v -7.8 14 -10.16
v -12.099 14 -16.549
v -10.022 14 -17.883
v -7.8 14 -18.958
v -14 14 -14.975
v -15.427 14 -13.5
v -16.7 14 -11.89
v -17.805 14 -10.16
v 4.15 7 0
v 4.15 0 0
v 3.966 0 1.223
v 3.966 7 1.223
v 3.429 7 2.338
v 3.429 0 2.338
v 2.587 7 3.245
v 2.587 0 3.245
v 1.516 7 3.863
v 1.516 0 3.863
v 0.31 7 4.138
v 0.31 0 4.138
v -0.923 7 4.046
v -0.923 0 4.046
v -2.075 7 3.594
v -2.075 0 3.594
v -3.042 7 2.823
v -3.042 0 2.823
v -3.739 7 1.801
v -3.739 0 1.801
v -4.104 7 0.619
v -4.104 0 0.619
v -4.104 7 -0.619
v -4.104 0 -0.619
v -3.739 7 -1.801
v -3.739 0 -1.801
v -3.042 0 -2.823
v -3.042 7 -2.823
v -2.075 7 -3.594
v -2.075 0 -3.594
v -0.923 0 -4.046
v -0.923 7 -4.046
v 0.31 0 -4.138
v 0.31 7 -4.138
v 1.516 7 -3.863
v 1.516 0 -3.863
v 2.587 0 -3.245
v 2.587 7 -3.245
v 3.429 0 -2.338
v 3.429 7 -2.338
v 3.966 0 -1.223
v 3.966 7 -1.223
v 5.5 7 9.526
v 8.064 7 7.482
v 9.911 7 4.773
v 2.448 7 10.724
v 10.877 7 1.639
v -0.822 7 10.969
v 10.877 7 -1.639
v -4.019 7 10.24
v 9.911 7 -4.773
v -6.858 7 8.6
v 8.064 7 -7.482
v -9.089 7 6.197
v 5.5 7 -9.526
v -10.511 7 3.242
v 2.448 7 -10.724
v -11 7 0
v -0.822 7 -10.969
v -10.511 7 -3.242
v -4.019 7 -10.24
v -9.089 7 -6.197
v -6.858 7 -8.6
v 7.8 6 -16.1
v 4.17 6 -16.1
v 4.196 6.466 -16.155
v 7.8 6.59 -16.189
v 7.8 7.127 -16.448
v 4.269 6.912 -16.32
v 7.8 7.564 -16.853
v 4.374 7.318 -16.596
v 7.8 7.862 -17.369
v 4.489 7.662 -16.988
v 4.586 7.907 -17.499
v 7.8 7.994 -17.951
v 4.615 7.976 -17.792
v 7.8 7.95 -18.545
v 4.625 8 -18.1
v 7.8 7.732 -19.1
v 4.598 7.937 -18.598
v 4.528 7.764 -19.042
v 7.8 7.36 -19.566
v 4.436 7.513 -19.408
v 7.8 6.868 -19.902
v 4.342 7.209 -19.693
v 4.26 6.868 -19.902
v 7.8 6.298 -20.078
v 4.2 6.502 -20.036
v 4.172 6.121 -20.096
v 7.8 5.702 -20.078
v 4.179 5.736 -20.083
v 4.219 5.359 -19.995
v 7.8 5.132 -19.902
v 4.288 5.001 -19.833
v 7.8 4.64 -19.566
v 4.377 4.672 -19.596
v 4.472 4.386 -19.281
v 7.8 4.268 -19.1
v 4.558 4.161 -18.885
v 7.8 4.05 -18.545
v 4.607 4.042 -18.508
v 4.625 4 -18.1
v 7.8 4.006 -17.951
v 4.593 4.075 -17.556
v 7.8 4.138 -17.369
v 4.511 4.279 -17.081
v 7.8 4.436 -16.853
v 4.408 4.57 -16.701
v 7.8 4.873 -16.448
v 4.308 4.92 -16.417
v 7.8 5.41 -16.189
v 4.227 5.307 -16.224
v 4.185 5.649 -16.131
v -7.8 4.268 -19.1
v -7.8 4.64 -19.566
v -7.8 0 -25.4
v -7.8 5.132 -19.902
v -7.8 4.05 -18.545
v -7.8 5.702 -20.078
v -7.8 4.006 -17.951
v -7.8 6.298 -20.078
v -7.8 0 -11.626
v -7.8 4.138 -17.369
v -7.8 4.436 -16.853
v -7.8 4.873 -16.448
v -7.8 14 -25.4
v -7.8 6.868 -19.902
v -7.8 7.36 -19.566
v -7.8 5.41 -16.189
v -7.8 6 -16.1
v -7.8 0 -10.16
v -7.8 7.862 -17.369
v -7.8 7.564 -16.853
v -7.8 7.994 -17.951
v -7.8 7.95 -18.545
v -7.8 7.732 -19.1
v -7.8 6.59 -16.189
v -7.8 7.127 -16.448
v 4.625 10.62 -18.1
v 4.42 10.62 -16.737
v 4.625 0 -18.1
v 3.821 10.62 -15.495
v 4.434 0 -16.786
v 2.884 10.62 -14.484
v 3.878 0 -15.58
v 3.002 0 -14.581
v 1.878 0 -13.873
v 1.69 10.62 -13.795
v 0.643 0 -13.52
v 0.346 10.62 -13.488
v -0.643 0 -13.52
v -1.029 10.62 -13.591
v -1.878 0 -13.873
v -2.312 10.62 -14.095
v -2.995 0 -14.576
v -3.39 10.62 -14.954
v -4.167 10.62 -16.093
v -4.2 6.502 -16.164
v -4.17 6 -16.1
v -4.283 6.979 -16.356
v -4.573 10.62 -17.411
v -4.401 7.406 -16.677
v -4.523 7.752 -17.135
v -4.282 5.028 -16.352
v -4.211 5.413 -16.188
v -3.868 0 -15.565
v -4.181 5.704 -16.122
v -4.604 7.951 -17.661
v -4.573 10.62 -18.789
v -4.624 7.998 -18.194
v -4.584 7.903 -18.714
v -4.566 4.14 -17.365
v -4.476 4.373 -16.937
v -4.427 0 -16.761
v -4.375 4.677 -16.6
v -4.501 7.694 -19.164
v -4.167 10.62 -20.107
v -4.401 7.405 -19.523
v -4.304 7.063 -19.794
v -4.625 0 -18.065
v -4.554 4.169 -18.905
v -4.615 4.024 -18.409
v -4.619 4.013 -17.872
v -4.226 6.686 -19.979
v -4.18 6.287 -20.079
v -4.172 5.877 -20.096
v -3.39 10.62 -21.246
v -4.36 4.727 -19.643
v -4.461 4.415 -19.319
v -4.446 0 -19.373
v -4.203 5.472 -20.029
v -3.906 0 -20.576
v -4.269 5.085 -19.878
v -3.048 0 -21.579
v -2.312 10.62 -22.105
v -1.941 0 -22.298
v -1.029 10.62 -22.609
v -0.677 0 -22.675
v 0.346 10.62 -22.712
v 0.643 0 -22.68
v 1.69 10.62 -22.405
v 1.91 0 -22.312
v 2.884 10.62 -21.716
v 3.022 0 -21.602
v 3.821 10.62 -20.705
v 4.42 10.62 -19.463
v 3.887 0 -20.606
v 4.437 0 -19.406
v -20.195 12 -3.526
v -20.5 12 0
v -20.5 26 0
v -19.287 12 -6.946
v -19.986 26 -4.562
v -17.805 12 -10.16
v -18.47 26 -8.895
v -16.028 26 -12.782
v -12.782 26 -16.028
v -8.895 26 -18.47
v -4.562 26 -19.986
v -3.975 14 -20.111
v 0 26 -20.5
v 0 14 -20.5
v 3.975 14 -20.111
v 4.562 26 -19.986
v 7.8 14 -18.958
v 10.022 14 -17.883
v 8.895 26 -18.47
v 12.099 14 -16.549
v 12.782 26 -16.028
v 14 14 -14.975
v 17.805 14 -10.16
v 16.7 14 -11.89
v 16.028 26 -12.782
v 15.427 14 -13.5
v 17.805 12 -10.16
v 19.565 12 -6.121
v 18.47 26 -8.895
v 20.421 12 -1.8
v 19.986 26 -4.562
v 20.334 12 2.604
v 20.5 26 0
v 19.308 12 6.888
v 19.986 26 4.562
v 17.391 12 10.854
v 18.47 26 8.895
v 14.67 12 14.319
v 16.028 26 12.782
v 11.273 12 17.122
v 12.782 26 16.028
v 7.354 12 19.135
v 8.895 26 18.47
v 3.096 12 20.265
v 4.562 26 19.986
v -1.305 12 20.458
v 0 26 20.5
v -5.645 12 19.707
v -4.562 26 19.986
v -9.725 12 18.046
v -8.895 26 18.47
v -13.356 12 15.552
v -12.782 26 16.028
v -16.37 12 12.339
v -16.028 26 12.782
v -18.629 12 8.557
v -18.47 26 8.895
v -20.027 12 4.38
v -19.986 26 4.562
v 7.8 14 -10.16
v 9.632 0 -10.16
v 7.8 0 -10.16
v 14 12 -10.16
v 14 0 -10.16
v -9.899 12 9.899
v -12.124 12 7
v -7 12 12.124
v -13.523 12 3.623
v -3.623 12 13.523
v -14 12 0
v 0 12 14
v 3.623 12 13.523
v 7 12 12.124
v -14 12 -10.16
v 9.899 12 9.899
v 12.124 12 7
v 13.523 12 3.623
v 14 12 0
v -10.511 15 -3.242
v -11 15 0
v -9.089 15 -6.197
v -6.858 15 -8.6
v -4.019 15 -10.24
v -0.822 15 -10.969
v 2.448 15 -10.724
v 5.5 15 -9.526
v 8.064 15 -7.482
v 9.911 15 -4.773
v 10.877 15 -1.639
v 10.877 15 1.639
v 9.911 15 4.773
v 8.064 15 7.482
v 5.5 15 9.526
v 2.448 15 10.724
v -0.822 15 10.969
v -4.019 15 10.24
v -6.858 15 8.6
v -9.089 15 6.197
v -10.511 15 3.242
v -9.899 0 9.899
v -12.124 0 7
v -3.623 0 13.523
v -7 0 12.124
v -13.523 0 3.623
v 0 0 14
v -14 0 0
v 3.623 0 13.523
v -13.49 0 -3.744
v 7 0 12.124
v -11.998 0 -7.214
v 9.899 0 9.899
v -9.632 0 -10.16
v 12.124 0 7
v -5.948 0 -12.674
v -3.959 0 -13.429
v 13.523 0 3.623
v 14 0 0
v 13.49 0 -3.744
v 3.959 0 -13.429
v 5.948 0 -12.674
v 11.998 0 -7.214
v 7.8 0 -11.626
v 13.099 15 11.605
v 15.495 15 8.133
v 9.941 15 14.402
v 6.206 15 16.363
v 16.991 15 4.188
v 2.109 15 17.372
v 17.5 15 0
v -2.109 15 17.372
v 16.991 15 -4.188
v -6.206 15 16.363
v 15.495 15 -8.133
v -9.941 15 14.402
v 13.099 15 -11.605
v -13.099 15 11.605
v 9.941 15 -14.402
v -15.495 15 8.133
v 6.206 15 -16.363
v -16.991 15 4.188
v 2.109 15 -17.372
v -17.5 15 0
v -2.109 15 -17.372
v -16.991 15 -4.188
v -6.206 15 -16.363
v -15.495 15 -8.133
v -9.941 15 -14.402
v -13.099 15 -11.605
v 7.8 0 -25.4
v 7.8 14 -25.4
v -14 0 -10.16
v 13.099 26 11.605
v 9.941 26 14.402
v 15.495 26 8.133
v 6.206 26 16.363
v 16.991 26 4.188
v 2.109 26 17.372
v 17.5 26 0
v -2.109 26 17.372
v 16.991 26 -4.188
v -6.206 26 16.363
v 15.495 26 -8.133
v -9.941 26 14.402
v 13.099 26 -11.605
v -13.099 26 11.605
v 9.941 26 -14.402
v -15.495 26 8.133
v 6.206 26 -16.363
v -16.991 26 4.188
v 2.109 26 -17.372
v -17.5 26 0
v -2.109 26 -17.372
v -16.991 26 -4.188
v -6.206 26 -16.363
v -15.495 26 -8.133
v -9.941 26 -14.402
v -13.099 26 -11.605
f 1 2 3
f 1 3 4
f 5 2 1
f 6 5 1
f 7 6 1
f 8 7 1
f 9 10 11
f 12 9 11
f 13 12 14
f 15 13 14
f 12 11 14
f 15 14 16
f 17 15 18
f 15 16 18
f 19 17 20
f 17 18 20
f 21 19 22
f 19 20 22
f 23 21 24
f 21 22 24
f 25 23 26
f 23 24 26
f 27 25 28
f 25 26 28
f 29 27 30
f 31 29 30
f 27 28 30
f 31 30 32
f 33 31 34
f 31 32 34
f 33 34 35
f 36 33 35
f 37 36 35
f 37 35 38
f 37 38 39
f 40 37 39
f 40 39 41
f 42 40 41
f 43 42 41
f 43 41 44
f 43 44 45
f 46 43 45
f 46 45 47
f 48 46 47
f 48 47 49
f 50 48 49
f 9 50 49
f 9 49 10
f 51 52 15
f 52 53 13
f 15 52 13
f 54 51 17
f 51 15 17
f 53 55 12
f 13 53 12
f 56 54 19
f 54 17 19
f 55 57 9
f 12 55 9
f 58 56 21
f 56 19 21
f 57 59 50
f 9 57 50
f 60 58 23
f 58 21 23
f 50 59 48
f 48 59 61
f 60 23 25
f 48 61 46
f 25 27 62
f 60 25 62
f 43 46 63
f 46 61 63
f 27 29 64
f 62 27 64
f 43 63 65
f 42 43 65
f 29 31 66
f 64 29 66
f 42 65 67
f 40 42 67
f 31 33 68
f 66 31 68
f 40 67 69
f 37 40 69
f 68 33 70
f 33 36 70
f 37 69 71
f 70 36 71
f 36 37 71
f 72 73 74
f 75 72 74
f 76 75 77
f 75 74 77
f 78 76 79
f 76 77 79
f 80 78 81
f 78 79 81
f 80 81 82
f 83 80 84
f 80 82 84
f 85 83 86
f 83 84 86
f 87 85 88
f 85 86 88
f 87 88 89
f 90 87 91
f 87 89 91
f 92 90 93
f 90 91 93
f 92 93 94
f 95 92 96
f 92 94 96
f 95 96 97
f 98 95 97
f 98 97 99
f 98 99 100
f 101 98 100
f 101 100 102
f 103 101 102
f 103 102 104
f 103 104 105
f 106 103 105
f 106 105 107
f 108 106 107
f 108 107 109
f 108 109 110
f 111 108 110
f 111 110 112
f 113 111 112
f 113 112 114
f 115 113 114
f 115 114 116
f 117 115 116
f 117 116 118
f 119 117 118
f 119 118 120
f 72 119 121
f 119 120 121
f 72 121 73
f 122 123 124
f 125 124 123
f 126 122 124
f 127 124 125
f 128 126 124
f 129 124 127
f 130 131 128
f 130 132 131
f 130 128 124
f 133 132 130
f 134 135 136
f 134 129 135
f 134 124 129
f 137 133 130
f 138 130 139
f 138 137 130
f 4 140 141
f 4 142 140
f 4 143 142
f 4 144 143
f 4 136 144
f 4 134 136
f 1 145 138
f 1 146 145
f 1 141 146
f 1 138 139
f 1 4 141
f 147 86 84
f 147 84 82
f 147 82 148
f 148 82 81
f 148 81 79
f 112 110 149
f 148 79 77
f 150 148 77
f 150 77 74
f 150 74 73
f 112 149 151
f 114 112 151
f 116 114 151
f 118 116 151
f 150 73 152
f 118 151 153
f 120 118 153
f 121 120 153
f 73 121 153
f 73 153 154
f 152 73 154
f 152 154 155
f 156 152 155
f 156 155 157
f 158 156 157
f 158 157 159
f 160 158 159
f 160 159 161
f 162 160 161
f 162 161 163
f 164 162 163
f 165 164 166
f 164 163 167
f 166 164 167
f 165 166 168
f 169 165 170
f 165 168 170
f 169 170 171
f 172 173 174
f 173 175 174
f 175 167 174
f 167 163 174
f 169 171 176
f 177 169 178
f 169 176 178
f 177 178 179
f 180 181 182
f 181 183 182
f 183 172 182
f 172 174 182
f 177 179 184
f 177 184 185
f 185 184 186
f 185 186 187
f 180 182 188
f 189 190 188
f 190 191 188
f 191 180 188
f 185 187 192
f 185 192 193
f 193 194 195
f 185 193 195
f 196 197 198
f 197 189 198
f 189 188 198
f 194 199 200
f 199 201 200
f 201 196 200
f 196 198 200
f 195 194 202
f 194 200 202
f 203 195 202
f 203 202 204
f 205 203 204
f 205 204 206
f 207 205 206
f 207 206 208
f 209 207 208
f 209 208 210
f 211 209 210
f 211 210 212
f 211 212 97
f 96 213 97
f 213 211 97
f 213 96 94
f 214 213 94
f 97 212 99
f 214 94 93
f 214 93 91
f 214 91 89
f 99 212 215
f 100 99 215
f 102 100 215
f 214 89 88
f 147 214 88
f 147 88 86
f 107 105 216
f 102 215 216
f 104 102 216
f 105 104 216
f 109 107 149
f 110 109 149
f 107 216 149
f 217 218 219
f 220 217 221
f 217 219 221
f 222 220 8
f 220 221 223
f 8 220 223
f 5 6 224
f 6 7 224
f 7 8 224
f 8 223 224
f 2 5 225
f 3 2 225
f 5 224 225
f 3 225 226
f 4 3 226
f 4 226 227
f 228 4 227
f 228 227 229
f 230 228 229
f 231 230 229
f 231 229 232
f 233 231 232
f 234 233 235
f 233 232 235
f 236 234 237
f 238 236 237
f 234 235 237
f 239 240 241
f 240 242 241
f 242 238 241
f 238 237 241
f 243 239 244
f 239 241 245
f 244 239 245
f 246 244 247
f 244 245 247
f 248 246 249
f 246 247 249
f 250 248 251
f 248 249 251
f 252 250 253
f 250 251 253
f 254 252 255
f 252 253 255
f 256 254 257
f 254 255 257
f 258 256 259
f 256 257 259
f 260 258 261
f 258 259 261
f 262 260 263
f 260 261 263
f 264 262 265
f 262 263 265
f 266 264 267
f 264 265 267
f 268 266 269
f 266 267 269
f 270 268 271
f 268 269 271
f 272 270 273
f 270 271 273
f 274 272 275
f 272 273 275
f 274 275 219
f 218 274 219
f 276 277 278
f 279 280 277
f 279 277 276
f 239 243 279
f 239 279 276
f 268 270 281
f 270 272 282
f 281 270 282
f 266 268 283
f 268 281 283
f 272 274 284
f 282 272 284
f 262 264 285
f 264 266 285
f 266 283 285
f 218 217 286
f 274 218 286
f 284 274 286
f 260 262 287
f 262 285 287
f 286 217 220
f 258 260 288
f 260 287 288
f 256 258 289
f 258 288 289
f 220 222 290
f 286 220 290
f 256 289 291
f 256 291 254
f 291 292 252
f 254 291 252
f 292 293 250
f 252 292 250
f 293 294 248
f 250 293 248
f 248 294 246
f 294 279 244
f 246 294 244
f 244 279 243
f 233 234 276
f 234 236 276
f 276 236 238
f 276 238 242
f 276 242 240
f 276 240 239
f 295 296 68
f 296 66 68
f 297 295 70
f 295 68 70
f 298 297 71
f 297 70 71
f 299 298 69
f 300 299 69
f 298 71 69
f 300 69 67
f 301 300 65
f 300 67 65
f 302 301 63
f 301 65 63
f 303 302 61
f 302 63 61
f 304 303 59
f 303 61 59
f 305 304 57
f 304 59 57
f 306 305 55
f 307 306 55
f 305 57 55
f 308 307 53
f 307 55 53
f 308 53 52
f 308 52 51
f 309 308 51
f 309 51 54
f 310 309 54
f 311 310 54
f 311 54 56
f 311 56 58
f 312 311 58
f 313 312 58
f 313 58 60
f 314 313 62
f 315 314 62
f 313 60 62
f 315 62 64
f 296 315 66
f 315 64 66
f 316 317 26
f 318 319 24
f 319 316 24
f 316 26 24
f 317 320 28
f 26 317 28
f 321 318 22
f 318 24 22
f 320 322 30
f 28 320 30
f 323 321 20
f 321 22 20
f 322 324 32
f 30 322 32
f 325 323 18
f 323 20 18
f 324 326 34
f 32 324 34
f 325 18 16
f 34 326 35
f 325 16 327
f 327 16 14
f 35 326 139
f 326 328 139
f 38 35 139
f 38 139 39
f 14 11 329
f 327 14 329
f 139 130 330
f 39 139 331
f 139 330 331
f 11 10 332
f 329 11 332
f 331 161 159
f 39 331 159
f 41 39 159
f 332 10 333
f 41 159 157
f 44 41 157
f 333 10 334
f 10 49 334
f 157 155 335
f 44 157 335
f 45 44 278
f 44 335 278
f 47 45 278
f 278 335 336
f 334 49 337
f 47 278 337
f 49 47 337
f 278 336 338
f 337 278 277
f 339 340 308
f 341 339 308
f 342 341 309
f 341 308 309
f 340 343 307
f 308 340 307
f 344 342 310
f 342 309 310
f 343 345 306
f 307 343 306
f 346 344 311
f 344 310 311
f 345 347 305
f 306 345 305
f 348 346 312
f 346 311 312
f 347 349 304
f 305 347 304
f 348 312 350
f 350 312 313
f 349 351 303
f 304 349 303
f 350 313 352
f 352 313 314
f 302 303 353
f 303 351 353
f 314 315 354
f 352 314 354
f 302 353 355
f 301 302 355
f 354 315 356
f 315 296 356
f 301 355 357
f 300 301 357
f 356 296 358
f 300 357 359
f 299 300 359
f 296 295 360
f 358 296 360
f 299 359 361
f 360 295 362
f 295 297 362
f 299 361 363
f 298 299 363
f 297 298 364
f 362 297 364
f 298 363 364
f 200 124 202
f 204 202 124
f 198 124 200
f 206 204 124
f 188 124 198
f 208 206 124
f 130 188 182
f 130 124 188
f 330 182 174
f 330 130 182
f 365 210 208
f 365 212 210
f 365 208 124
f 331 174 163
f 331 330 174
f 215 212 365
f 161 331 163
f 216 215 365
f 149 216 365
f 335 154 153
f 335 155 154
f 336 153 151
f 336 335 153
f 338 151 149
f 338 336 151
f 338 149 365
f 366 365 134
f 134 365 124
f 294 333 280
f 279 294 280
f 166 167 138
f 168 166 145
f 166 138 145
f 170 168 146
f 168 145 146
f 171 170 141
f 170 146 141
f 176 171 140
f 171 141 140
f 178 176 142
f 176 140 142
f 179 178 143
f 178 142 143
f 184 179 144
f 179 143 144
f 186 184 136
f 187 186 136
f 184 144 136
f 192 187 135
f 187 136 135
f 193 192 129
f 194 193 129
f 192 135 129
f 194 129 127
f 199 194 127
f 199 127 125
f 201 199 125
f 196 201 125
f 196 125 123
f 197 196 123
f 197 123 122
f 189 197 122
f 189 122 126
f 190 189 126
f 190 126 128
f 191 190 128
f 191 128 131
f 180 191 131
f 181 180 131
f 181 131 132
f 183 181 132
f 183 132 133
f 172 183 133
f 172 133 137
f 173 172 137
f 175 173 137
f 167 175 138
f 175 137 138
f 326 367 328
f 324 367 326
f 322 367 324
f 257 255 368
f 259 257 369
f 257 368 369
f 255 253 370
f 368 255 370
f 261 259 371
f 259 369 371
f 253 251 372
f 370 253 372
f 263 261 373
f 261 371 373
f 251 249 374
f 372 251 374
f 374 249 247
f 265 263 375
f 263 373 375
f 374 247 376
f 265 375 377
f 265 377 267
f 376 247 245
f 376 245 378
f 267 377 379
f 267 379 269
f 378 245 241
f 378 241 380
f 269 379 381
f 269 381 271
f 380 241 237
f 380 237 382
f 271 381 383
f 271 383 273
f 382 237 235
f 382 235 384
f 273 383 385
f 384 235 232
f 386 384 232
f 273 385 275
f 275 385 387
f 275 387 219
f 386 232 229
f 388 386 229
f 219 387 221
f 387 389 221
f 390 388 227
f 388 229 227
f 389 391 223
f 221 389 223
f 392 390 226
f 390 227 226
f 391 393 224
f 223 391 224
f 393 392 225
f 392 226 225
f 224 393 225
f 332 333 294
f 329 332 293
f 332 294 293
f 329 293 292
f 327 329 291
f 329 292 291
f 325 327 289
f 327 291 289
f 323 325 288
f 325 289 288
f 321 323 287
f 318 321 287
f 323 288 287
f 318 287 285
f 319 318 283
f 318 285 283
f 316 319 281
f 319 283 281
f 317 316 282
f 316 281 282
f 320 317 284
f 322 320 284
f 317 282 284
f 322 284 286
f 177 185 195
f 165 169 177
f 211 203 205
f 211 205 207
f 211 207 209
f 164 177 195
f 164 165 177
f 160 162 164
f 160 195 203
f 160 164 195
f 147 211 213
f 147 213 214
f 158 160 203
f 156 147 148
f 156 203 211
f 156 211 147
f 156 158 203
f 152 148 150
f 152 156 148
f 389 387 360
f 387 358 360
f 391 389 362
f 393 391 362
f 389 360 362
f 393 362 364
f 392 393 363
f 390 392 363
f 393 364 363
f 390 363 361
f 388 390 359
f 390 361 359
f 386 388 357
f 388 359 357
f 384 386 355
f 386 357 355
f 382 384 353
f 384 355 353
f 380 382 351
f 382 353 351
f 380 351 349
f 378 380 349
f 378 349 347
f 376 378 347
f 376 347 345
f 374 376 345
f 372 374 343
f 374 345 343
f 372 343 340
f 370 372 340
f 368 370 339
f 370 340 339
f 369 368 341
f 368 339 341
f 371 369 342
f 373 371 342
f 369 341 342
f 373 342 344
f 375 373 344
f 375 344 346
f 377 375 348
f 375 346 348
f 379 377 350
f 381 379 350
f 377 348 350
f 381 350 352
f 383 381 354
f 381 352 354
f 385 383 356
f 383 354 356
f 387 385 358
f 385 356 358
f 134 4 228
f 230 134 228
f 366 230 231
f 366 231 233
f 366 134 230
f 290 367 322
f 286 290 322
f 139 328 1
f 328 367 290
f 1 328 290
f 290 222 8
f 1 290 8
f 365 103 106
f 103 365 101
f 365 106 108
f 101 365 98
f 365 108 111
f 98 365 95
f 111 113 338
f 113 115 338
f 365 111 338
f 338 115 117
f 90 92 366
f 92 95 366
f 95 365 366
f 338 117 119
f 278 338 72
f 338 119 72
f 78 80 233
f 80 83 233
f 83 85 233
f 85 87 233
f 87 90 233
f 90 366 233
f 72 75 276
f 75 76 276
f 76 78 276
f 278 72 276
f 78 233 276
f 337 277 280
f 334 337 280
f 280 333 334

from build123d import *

# Parameters (mm, degrees)
SKETCH2_R           = 4.15
CUT_EXTRUDE1_DEPTH  = 26.999999876
BOSS_EXTRUDE1_DEPTH = 12
SKETCH4_R           = 4.62499994
CUT_EXTRUDE2_DEPTH  = 10.62
SKETCH5_R           = 2
CUT_EXTRUDE3_DEPTH  = 22.86
BOSS_EXTRUDE2_DEPTH = 2
SKETCH7_W           = 15.24
SKETCH7_H           = 13.999999876
CUT_EXTRUDE4_DEPTH  = 12.699999968


with BuildPart() as part:
    # Sketch1 → Revolve1 (revolve)
    with BuildSketch(Plane.XY):
        Polygon((0, 0), (-14.000000152, 0), (-14.000000152, 11.999999876), (-20.500000052, 11.999999876), (-20.500000052, 25.999999876), (-17.500000052, 25.999999876), (-17.500000052, 14.999999876), (-11.000000152, 14.999999876), (-11.000000152, 6.999999906), (0, 6.999999906), align=None)
    revolve(axis=Axis((0, 6.999999906, 0), (0, -1, 0)))

    # Sketch2 → Cut-Extrude1 (cut, through all)
    with BuildSketch(Plane.XZ):
        Circle(SKETCH2_R)
    extrude(amount=-CUT_EXTRUDE1_DEPTH, mode=Mode.SUBTRACT)

    # Sketch3 → Boss-Extrude1 (add)
    with BuildSketch(Plane.XZ.offset(-11.999999876)):
        with BuildLine():
            Line((-14.000000152, 0), (-14.000000152, -25.4))
            Line((-14.000000152, -25.4), (14.000000152, -25.4))
            Line((14.000000152, -25.4), (14.000000152, 0))
            ThreePointArc((14.000000152, 0), (0, -14.000000152), (-14.000000152, 0))
        make_face()
    extrude(amount=BOSS_EXTRUDE1_DEPTH)

    # Sketch4 → Cut-Extrude2 (cut)
    with BuildSketch(Plane.XZ):
        with Locations((0, -18.1)):
            Circle(SKETCH4_R)
    extrude(amount=-CUT_EXTRUDE2_DEPTH, mode=Mode.SUBTRACT)

    # Sketch5 → Cut-Extrude3 (cut)
    with BuildSketch(Plane.ZY.offset(14.000000152)):
        with Locations((-18.1, 6.000000096)):
            Circle(SKETCH5_R)
    extrude(amount=-CUT_EXTRUDE3_DEPTH, mode=Mode.SUBTRACT)

    # Sketch6 → Boss-Extrude2 (add)
    with BuildSketch(Plane(origin=(0, 11.999999876, 0), x_dir=(1, 0, 0), z_dir=(0, 1, 0))):
        with BuildLine():
            Line((14.000000152, 14.974979061), (14.000000152, 25.4))
            Line((14.000000152, 25.4), (-14.000000152, 25.4))
            Line((-14.000000152, 25.4), (-14.000000152, 14.974979061))
            ThreePointArc((-14.000000152, 14.974979061), (0, 20.500000052), (14.000000152, 14.974979061))
        make_face()
    extrude(amount=BOSS_EXTRUDE2_DEPTH)

    # Sketch7 → Cut-Extrude4 (cut)
    with BuildSketch(Plane.ZY.offset(20.500000052)):
        with Locations((-17.78, 6.999999938)):
            Rectangle(SKETCH7_W, SKETCH7_H)
    cut_extrude4 = extrude(amount=-CUT_EXTRUDE4_DEPTH, mode=Mode.SUBTRACT)

    # Mirror1: Cut-Extrude4 across plane
    add(cut_extrude4.mirror(Plane(origin=(0, 0, 0), x_dir=(0, 0, 1), z_dir=(1, 0, 0))), mode=Mode.SUBTRACT)


solid = part.part
